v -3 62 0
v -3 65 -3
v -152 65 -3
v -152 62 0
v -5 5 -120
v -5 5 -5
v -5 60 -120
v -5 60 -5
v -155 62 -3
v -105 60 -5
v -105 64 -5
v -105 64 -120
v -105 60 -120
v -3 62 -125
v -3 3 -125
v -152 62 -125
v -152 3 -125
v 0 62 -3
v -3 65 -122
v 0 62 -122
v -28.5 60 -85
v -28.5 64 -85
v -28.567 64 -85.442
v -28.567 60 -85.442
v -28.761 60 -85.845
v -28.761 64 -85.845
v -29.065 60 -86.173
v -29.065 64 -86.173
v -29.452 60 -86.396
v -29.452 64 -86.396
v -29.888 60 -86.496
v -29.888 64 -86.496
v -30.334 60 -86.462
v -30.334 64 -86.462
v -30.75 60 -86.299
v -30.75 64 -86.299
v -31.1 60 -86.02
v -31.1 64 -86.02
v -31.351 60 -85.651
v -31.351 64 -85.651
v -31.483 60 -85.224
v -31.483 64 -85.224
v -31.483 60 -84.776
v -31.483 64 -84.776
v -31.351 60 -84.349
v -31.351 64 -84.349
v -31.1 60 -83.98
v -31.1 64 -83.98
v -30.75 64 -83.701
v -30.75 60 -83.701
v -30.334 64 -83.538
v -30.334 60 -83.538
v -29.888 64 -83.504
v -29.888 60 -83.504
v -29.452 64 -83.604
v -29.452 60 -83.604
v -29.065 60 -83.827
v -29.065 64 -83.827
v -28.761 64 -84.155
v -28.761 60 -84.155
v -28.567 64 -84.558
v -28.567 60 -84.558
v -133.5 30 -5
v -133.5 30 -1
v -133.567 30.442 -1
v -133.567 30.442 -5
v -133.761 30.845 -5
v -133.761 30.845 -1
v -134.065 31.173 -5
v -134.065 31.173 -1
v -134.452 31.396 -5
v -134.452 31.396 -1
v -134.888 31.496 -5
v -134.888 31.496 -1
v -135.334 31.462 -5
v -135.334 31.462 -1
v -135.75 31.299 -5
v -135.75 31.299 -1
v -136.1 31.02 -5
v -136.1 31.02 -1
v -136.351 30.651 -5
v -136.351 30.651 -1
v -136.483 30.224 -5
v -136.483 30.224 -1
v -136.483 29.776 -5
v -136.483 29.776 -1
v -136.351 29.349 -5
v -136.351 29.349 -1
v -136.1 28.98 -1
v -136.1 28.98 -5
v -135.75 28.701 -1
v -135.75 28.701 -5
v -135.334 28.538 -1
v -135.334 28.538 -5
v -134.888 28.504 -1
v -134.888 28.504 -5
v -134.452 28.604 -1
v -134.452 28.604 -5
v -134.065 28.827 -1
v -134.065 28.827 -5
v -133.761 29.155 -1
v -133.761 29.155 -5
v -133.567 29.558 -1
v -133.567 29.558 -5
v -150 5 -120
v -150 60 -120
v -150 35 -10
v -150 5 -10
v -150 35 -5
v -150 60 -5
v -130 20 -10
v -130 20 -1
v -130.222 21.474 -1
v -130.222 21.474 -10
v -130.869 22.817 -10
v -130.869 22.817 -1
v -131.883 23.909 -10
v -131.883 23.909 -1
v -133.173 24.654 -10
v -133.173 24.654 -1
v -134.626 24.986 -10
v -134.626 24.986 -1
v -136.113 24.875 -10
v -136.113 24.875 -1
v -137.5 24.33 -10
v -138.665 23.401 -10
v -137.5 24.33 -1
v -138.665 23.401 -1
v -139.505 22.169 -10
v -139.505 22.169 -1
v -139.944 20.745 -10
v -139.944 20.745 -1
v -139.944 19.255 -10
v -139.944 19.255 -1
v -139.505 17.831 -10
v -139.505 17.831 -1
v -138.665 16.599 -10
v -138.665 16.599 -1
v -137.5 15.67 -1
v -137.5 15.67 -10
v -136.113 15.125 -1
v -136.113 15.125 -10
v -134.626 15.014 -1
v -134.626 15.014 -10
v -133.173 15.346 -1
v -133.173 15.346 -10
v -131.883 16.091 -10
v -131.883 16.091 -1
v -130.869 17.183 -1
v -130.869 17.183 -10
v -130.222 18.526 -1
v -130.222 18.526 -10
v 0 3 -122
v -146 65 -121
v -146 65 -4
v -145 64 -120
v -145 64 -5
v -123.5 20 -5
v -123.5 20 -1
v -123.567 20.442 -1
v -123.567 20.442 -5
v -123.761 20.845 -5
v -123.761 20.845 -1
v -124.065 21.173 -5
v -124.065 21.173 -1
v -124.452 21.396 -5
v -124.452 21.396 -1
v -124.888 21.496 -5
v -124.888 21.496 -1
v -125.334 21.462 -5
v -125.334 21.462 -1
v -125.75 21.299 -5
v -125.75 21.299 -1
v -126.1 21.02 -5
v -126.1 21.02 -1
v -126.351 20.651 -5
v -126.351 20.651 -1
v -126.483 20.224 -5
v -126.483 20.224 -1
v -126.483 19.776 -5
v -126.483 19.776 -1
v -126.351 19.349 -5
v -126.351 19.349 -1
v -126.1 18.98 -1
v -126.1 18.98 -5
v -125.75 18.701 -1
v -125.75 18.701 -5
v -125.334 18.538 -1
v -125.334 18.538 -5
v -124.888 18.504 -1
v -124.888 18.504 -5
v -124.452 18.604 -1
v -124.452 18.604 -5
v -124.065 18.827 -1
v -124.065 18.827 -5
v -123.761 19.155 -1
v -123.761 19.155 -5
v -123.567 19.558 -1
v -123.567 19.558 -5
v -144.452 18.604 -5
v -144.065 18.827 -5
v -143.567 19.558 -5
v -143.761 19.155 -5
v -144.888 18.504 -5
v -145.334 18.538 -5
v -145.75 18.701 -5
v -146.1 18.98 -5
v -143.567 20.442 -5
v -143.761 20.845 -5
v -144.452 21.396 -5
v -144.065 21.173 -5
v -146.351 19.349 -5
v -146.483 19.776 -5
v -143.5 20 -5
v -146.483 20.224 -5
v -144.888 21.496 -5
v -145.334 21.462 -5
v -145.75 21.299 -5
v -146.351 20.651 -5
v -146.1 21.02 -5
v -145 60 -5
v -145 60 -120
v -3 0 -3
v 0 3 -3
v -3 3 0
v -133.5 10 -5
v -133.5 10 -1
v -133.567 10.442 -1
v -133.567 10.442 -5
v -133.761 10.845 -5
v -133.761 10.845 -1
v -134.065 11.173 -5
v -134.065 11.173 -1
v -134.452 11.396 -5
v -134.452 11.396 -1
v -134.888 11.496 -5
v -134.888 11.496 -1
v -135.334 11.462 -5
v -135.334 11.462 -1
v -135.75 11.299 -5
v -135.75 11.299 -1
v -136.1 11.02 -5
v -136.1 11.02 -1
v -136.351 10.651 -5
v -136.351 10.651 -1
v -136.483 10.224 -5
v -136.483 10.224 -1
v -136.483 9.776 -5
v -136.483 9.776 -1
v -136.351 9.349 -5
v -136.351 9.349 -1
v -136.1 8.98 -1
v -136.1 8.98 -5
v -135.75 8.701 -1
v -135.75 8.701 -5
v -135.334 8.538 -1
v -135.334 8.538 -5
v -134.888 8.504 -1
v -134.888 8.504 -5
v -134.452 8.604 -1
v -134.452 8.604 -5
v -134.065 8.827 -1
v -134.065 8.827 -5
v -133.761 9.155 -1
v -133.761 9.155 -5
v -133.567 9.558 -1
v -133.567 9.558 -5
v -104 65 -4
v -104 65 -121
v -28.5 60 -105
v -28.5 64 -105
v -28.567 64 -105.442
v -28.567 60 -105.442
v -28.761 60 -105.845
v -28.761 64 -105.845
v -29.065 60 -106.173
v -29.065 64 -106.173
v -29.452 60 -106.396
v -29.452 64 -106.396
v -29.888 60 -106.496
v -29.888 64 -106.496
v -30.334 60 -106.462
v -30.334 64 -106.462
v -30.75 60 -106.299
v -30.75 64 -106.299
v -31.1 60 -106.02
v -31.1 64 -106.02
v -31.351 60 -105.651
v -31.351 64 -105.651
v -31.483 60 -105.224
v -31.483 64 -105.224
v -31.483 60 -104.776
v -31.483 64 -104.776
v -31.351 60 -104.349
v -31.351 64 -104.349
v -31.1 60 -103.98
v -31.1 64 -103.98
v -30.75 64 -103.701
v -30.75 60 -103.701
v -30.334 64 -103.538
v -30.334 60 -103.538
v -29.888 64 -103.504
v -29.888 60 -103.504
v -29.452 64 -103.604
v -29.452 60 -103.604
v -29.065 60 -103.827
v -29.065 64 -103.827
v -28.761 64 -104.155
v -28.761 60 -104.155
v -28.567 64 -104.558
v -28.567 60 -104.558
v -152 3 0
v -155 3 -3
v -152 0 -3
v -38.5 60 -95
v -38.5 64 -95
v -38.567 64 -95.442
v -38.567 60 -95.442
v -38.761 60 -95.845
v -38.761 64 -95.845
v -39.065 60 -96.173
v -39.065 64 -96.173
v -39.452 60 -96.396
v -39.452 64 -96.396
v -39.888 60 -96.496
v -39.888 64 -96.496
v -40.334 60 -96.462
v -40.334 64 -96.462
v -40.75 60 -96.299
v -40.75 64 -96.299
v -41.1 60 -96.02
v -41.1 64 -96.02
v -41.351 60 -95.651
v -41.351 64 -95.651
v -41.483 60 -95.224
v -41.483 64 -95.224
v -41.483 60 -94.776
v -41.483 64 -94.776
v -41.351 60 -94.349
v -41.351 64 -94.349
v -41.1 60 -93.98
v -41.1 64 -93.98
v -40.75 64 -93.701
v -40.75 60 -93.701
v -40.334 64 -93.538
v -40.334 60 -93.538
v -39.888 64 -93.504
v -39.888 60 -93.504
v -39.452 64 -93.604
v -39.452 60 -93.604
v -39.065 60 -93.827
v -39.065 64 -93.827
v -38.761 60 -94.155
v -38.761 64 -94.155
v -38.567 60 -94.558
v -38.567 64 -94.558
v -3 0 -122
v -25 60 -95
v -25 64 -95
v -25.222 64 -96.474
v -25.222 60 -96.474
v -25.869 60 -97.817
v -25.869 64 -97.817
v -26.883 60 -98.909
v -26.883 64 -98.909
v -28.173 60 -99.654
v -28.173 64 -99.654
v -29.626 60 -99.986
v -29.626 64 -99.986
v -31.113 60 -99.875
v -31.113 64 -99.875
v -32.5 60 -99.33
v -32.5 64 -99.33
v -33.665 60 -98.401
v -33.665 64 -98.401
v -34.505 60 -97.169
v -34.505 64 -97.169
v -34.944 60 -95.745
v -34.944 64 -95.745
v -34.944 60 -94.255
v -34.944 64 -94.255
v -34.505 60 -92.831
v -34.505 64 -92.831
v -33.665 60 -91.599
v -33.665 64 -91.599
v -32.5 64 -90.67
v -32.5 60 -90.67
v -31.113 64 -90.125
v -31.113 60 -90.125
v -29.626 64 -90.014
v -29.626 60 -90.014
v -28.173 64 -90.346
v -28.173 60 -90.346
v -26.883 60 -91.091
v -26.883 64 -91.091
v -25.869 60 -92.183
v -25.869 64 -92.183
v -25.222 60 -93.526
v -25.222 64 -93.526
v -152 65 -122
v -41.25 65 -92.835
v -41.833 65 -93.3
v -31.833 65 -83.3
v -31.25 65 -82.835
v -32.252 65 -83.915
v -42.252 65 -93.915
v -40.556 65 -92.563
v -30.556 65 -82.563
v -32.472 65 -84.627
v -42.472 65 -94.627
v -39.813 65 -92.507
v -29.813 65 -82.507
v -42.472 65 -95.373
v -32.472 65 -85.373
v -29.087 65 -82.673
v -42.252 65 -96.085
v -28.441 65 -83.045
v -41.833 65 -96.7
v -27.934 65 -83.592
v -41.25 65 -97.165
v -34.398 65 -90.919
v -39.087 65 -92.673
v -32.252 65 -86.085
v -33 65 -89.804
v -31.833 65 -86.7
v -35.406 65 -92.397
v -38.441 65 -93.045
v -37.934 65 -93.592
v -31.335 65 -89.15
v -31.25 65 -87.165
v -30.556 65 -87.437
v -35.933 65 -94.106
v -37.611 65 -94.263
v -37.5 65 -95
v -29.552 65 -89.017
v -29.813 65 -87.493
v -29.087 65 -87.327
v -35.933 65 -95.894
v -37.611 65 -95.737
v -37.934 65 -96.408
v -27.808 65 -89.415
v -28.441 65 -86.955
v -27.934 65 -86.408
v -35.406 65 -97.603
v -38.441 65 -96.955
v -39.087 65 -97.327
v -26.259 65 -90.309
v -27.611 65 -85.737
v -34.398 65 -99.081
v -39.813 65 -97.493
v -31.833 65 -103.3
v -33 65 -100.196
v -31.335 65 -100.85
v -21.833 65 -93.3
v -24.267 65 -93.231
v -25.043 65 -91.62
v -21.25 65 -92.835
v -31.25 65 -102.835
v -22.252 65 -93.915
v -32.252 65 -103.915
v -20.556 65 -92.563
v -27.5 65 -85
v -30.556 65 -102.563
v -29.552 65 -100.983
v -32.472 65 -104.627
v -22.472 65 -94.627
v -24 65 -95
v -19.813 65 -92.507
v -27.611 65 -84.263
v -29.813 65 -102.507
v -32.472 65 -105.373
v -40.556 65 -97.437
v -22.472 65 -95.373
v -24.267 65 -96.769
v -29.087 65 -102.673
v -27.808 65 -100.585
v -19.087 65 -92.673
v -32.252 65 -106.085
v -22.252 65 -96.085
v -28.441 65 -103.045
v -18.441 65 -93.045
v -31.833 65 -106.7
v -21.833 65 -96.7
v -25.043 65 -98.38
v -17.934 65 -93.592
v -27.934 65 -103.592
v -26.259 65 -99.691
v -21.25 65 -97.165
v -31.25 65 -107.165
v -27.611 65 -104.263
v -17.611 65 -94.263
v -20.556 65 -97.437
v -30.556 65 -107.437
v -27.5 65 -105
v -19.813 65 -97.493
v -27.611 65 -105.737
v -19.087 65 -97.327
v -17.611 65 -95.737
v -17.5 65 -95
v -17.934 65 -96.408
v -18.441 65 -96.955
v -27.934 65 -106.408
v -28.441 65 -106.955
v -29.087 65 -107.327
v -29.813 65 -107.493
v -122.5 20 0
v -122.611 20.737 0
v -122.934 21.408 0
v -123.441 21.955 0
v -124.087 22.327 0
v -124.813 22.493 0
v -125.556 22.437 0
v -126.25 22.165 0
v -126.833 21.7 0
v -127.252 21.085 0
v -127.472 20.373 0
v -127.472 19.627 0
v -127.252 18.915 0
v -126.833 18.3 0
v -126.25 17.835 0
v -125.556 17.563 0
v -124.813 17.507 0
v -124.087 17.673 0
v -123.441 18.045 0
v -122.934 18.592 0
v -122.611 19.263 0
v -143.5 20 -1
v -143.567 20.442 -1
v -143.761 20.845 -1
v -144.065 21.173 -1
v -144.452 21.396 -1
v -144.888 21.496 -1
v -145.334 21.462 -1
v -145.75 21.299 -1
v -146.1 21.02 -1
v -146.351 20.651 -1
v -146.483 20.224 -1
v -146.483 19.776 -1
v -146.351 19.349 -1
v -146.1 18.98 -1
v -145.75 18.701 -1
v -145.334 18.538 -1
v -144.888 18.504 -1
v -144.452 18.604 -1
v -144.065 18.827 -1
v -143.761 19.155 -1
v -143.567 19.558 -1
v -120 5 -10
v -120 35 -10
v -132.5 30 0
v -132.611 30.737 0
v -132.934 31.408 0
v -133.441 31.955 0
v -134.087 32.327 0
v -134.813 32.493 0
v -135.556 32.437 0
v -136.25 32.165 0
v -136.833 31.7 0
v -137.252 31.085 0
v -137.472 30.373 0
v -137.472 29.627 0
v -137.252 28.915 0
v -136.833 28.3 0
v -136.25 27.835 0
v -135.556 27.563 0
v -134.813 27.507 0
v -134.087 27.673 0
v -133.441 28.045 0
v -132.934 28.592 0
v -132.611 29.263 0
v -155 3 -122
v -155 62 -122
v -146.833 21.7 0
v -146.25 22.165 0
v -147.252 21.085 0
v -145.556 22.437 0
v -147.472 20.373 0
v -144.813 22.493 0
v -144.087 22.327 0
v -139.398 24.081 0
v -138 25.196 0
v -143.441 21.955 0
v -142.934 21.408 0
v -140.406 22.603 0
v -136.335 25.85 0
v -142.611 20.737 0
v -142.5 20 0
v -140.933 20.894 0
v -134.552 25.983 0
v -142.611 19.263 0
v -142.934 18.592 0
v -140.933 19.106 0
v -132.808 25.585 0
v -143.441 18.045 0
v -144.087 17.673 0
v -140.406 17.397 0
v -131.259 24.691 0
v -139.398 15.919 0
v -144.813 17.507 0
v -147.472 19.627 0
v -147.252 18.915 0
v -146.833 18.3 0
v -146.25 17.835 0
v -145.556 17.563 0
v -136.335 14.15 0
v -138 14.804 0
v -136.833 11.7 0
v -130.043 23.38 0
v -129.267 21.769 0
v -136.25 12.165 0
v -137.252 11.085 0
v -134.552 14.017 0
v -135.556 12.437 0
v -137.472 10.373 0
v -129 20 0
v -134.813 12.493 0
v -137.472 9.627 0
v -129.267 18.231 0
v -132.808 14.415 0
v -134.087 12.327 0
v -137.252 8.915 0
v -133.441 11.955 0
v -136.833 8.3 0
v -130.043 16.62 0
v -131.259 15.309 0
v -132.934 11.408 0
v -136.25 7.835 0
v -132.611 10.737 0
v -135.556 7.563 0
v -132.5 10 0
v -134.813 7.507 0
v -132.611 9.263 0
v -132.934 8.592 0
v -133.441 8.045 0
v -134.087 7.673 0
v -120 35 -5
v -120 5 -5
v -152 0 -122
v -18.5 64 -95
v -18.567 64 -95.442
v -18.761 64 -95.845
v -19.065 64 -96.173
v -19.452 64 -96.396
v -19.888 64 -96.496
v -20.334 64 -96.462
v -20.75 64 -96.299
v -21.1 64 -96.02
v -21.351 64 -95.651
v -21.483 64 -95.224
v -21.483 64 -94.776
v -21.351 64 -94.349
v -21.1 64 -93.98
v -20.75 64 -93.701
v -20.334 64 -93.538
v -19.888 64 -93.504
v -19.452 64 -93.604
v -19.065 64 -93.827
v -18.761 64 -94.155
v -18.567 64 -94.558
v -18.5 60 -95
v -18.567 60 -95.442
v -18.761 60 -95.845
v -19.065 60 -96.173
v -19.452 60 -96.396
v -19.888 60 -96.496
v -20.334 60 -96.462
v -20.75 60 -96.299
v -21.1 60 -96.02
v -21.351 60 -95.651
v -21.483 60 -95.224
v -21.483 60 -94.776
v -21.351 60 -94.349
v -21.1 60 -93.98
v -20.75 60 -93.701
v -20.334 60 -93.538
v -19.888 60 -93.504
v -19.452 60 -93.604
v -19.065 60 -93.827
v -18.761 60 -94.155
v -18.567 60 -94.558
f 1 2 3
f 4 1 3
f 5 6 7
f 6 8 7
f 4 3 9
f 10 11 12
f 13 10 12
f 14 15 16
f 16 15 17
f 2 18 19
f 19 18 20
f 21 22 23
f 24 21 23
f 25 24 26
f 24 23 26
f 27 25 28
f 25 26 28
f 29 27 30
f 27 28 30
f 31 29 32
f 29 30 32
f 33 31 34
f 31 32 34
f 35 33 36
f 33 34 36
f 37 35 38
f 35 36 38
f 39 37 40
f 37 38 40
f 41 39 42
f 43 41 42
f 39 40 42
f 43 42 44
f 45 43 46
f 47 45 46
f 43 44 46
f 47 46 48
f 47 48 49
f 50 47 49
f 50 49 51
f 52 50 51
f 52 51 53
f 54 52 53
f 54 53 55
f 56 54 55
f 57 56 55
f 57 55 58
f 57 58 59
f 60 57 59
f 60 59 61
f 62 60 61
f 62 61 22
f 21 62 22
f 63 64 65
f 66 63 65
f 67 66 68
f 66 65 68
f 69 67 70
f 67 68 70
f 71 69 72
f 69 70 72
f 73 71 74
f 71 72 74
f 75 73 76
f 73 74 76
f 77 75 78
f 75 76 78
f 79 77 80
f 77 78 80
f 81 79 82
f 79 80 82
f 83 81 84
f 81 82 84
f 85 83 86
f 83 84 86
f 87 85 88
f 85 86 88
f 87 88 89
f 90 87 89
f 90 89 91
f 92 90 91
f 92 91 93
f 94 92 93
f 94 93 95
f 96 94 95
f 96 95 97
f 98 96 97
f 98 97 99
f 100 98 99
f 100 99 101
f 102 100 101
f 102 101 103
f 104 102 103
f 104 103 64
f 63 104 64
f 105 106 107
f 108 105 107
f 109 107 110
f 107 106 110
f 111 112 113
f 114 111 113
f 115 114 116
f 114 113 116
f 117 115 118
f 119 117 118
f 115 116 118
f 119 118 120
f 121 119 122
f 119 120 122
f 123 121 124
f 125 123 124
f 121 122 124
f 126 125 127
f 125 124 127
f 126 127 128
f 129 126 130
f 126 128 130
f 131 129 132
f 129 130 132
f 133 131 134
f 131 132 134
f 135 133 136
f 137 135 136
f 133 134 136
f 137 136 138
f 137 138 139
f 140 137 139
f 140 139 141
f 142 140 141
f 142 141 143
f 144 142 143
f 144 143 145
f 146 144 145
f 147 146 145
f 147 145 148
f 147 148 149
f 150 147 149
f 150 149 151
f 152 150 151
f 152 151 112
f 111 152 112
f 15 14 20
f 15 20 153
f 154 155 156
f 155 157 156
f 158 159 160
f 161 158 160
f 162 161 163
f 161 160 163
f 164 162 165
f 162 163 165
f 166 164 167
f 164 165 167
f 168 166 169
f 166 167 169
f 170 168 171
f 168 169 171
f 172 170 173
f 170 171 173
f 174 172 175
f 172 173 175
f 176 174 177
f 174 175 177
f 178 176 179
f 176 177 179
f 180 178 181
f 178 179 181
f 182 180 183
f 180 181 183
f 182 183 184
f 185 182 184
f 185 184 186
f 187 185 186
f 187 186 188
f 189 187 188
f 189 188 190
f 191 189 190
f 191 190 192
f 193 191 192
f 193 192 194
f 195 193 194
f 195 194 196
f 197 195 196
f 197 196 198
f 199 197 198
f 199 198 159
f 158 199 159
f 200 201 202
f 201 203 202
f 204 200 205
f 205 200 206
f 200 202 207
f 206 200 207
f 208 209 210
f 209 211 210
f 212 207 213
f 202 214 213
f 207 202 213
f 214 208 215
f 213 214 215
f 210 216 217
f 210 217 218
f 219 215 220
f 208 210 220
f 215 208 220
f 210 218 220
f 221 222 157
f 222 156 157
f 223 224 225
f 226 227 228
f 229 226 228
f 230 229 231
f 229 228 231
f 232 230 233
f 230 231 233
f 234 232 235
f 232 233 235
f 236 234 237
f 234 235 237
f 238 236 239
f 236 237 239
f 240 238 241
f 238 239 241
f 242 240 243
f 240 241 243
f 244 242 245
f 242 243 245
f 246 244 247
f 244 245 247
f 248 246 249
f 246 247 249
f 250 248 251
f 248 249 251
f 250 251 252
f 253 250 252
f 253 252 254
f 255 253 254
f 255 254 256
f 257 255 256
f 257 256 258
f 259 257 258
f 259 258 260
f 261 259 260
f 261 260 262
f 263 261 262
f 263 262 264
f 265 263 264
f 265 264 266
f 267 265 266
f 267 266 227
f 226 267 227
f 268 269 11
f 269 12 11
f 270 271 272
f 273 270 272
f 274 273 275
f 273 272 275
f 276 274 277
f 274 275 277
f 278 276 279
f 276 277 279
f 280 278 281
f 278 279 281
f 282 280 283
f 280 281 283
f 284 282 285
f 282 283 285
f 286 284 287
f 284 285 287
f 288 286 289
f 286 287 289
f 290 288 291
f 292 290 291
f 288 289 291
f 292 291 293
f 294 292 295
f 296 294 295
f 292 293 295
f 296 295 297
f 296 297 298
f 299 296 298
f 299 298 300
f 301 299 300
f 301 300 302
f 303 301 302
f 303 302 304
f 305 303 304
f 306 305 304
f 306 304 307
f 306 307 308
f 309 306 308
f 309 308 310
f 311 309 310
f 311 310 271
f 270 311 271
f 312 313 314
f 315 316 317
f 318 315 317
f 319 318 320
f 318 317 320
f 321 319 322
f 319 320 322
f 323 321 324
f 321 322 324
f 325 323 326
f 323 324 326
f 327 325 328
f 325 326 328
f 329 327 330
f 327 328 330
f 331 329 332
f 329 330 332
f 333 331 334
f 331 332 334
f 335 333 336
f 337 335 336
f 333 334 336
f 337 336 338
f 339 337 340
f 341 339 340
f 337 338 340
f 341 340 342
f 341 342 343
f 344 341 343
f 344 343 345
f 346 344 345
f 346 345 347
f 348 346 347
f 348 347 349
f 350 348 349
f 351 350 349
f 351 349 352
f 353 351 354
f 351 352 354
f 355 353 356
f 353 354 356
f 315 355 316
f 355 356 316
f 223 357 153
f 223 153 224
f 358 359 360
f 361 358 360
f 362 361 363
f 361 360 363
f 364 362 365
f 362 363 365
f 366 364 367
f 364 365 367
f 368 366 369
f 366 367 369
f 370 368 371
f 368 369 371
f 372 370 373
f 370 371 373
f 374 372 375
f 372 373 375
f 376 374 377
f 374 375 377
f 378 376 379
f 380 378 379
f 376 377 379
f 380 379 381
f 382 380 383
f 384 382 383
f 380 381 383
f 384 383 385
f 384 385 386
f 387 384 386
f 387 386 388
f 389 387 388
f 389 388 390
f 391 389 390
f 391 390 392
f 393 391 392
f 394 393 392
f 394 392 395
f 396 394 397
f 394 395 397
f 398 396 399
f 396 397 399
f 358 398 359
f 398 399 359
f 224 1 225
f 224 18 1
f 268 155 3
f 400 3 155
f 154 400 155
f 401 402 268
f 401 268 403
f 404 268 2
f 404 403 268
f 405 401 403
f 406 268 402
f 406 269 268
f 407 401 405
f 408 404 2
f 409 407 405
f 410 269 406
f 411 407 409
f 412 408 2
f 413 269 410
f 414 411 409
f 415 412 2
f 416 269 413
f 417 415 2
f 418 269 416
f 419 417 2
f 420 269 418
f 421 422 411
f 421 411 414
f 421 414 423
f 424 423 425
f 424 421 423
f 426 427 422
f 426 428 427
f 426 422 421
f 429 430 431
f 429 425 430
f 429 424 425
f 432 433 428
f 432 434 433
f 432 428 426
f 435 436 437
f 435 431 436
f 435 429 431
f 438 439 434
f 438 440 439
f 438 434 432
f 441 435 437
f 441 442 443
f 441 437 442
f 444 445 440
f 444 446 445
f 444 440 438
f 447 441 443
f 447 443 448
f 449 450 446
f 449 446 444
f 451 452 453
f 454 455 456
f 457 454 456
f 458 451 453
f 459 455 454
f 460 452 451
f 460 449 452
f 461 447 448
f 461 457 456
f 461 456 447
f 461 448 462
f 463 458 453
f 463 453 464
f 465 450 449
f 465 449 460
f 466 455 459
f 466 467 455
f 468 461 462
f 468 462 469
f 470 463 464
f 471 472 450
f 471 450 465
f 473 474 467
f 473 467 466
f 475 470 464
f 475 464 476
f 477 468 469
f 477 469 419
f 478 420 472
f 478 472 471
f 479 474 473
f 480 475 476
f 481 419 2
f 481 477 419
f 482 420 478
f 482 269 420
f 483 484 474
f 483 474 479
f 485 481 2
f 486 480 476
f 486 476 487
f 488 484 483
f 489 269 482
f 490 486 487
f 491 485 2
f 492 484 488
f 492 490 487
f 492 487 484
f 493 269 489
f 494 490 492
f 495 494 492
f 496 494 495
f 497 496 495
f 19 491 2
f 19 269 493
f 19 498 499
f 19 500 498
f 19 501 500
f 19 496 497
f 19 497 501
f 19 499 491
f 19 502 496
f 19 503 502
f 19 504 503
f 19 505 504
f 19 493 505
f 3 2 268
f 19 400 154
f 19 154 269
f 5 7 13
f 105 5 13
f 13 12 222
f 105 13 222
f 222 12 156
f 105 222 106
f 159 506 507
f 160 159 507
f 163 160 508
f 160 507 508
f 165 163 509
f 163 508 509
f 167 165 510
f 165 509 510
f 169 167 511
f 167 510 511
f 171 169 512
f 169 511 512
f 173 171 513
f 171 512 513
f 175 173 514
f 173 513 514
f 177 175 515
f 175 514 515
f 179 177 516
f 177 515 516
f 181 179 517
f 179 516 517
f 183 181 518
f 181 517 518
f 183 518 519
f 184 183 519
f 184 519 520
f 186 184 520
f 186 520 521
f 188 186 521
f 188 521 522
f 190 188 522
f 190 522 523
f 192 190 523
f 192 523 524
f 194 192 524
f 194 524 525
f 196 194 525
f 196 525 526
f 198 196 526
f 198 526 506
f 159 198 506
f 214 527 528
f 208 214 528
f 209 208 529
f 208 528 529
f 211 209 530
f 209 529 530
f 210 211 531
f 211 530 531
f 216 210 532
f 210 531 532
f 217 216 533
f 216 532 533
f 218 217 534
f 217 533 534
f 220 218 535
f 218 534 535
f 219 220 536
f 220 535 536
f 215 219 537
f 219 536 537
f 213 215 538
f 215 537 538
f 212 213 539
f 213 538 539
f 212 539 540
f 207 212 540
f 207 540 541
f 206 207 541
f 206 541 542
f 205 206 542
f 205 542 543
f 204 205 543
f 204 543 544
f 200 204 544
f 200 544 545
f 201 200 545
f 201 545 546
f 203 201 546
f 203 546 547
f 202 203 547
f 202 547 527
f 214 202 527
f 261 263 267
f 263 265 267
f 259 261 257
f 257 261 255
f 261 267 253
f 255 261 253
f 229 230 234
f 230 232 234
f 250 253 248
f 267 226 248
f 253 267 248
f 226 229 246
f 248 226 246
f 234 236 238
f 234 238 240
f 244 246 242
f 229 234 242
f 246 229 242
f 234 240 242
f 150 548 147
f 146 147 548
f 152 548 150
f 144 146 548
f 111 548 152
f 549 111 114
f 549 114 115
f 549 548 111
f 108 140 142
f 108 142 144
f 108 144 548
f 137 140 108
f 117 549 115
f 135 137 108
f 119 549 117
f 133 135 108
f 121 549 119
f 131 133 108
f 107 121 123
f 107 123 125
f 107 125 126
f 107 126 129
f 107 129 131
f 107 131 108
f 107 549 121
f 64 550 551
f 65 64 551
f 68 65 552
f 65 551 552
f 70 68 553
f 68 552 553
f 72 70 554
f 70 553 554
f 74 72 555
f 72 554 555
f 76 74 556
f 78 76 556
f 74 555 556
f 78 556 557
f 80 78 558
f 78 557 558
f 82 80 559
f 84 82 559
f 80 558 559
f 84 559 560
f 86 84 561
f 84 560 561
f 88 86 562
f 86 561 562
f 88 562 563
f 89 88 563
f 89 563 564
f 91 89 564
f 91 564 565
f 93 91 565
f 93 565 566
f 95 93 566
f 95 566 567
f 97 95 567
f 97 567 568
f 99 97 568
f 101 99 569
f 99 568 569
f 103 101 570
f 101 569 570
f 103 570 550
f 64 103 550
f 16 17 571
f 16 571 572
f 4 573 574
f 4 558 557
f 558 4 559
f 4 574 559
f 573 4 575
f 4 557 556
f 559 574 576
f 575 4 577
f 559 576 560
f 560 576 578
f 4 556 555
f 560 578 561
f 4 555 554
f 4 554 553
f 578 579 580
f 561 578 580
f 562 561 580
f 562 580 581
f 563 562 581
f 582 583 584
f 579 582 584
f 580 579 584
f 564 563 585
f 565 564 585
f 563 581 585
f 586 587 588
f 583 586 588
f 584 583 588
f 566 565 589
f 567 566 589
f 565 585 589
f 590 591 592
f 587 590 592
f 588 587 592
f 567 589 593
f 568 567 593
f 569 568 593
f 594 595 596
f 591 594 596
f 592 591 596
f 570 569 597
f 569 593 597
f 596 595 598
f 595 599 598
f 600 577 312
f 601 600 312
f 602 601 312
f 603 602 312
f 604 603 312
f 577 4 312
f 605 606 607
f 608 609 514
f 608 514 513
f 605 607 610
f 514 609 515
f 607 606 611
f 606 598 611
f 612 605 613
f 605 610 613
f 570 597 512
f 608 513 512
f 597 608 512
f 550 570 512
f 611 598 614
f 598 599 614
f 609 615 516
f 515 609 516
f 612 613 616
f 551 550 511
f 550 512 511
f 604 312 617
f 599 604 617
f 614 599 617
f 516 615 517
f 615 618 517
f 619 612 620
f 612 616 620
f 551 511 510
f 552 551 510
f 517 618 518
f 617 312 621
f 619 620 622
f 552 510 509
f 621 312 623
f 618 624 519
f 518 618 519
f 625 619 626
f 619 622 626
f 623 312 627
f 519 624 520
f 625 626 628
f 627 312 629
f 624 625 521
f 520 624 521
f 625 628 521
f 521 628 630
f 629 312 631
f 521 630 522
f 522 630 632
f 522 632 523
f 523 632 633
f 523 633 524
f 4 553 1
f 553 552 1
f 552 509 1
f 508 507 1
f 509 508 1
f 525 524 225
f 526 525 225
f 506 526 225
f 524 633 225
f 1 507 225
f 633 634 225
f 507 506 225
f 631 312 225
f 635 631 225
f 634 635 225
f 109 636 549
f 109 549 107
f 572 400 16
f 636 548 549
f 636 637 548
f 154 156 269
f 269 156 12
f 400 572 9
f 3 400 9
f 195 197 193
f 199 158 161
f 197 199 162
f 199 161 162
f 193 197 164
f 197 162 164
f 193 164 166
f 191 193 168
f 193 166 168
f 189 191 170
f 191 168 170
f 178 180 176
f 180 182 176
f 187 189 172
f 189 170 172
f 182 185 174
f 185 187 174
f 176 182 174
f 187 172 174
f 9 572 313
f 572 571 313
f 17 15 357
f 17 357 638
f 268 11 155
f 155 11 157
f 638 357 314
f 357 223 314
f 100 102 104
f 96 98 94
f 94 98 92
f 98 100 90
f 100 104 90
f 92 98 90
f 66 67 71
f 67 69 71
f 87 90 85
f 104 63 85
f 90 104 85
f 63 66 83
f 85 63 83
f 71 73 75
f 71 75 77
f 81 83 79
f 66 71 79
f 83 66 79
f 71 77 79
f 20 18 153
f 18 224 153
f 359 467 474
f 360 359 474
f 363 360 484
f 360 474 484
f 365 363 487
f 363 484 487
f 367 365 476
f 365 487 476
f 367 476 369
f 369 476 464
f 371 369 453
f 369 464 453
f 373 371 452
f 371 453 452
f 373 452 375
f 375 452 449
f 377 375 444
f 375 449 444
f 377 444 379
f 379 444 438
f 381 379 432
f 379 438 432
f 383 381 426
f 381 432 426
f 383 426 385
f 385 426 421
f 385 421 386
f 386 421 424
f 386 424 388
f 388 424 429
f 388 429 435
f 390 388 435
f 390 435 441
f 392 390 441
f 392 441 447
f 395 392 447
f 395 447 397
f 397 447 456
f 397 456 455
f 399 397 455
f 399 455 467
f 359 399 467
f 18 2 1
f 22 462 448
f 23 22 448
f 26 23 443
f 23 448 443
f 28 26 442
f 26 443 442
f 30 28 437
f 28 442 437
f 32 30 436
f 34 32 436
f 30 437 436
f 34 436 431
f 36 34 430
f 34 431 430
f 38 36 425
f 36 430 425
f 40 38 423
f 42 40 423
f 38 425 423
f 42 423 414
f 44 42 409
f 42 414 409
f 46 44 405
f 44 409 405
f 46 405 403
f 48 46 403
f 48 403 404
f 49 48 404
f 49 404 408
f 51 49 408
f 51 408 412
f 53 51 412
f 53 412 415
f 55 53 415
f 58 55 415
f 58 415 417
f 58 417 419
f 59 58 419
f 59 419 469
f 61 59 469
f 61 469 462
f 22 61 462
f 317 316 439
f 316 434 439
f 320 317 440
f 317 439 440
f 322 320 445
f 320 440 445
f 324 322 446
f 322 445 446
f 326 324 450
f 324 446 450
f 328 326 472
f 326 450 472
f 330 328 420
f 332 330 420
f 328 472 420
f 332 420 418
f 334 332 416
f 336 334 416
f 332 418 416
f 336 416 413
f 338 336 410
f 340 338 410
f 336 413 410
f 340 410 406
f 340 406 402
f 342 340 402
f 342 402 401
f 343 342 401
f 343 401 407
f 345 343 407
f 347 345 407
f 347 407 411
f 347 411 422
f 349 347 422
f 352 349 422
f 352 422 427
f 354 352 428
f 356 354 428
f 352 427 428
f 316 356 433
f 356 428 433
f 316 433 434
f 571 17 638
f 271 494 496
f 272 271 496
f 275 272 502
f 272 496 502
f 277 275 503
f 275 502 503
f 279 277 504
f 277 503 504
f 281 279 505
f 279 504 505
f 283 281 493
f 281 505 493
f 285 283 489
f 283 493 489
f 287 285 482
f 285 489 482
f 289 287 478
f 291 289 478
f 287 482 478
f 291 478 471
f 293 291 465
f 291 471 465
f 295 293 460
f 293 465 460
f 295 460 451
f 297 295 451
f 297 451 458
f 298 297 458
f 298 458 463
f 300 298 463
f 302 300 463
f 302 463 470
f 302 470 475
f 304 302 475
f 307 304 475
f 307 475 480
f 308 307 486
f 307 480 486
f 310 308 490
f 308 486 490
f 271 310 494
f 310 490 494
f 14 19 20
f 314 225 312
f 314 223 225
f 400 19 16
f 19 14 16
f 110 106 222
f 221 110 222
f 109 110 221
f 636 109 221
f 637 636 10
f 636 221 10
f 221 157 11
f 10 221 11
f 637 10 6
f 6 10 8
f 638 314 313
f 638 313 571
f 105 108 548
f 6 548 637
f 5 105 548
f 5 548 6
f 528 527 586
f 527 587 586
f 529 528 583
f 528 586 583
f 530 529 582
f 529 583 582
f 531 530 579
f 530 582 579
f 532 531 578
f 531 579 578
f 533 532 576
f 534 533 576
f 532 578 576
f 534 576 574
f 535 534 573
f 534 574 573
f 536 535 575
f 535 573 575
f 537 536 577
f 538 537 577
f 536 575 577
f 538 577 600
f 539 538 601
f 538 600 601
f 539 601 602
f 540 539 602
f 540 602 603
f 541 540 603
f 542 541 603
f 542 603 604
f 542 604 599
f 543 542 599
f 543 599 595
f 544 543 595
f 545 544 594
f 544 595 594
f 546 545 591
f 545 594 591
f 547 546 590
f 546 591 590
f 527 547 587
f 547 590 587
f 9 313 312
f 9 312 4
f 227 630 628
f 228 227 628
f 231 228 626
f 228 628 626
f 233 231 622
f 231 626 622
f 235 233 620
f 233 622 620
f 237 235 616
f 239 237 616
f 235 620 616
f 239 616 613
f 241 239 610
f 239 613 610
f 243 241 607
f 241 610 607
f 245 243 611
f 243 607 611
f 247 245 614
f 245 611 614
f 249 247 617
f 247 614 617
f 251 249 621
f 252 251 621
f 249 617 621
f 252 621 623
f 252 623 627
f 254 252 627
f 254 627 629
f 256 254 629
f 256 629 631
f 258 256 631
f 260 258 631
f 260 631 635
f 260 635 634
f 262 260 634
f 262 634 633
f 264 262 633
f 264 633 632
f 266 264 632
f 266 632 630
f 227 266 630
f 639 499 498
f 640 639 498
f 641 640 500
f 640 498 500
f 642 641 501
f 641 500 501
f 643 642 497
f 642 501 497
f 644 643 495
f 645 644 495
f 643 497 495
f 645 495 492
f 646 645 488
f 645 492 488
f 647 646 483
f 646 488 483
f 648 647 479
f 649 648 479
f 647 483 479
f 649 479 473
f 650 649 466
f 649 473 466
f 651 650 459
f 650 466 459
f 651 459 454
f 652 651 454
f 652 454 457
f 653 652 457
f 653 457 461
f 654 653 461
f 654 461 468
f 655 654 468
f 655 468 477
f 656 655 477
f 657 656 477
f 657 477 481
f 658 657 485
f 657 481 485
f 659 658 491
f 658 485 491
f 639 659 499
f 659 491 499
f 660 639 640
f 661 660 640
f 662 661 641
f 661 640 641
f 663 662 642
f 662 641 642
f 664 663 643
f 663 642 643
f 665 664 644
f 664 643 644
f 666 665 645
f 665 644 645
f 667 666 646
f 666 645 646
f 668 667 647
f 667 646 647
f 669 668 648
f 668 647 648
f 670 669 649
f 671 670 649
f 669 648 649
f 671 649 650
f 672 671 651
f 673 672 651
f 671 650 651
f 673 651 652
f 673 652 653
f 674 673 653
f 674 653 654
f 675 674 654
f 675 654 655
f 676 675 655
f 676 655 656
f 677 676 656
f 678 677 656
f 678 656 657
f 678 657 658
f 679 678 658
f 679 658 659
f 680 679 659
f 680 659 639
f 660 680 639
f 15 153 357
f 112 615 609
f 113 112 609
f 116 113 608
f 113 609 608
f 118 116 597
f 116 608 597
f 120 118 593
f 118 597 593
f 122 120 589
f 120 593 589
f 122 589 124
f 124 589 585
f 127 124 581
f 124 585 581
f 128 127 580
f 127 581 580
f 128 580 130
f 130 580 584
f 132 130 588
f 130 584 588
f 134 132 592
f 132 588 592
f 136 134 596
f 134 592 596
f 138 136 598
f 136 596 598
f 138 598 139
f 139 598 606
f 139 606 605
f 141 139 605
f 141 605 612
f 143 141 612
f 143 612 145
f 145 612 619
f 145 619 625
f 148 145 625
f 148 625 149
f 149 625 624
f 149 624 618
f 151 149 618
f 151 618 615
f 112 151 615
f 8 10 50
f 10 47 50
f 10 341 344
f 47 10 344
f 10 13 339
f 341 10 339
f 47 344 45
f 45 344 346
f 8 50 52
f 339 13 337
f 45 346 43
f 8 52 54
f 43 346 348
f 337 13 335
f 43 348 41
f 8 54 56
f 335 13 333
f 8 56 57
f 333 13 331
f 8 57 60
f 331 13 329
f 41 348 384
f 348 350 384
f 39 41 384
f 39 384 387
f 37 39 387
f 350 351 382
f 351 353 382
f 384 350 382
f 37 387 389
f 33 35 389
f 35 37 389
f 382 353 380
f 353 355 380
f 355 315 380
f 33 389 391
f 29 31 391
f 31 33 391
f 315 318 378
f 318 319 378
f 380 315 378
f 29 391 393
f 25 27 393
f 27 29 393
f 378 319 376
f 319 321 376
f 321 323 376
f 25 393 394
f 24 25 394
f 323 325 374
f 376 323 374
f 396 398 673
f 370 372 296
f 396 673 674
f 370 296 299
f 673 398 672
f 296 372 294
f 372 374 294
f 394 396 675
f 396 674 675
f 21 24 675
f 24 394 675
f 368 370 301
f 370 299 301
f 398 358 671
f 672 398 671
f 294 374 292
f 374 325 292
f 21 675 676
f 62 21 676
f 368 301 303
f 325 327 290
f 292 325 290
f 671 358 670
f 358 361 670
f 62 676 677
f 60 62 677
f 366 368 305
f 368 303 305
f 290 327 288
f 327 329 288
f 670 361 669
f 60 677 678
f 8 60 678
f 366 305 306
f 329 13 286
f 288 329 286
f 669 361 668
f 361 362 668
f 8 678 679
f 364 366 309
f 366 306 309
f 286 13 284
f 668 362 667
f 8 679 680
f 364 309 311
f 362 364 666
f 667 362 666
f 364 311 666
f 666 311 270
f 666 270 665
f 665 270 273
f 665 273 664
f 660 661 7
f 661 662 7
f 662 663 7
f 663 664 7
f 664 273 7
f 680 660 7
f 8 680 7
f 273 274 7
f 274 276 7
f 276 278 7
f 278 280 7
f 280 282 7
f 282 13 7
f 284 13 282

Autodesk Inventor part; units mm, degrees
ref_plane "YZ Plane" through (0, 0, 0) normal (1, 0, 0) x (0, 1, 0)
ref_plane "XZ Plane" through (0, 0, 0) normal (0, 1, 0) x (-1, 0, 0)
ref_plane "XY Plane" through (0, 0, 0) normal (0, 0, 1) x (1, 0, 0)
sketch "Sketch1" plane through (0, 0, 0) normal (0, 1, 0) x (-1, 0, 0)
  line L0 (0, 0) -> (155, 0)
  line L1 (155, 0) -> (155, -125)
  line L2 (155, -125) -> (0, -125)
  line L3 (0, -125) -> (0, 0)
  dimension "d0" = 125
  dimension "d1" = 155
extrude "Extrusion1" add sketch "Sketch1" along normal blind 60
sketch "Sketch2" plane through (0, 60, 0) normal (0, 1, 0) x (1, 0, 0)
  line L0 (-150, 5) -> (-5, 5)
  line L1 (-5, 5) -> (-5, 120)
  line L2 (-5, 120) -> (-150, 120)
  line L3 (-150, 120) -> (-150, 5)
  line L4 (-155, 0) -> (0, 0) projected
  line L5 (0, 125) -> (-155, 125) projected
  line L6 (-155, 125) -> (-155, 0) projected
  line L7 (0, 0) -> (0, 125) projected
  point P0 (-77.5, 125)
  dimension "d4" = 5
  dimension "d5" = 5
  dimension "d6" = 5
  dimension "d7" = 5
extrude "Extrusion2" cut sketch "Sketch2" against normal blind 55 contours L3 L2 L1 L0
sketch "Sketch3" plane through (0, 60, 0) normal (0, 1, 0) x (1, 0, 0)
  line L0 (-155, 0) -> (0, 0) projected
  line L1 (-155, 0) -> (0, 0)
  line L2 (0, 0) -> (0, 125)
  line L3 (0, 125) -> (-155, 125)
  line L4 (-155, 125) -> (-155, 0)
extrude "Extrusion3" add sketch "Sketch3" along normal blind 5
sketch "Sketch4" plane through (0, 65, 0) normal (0, 1, 0) x (1, 0, 0)
  circle A0 centre (-30, 95) radius 5
  line L0 (0, 125) -> (-155, 125) projected
  line L1 (0, 0) -> (0, 125) projected
  dimension "d12" = 10
  dimension "d13" = 30
  dimension "d14" = 30
extrude "Extrusion4" cut sketch "Sketch4" against normal blind 5
sketch "Sketch5" plane through (-155, 0, 0) normal (0, 0, 1) x (1, 0, 0)
  circle A0 centre (20, 20) radius 5
  line L0 (0, 0) -> (155, 0) projected
  line L1 (0, 0) -> (0, 65) projected
  dimension "d17" = 20
  dimension "d18" = 20
  dimension "d19" = 10
extrude "Extrusion5" cut sketch "Sketch5" against normal blind 20
sketch "Sketch6" plane through (0, 65, 0) normal (0, 1, 0) x (1, 0, 0)
  line L0 (-145, 5) -> (-105, 5)
  line L1 (-105, 5) -> (-105, 120)
  line L2 (-105, 120) -> (-145, 120)
  line L3 (-145, 120) -> (-145, 5)
  line L4 (-155, 125) -> (-155, 0) projected
  line L5 (0, 125) -> (-155, 125) projected
  line L6 (-155, 0) -> (0, 0) projected
  point P0 (-125, 5)
  dimension "d22" = 10
  dimension "d23" = 5
  dimension "d24" = 5
  dimension "d25" = 40
extrude "Extrusion6" cut sketch "Sketch6" against normal blind 5
sketch "Sketch7" plane through (-155, 0, 0) normal (0, 0, 1) x (1, 0, 0)
  circle A0 centre (20, 30) radius 1.5
  circle A1 centre (20, 20) radius 5 projected
  circle A2 centre (20, 20) radius 5
  circle A3 centre (10, 20) radius 1.5
  circle A4 centre (20, 10) radius 1.5
  circle A5 centre (30, 20) radius 1.5
  point P0 (155, 0)
  dimension "d28" = 3
  dimension "d31" = 360
  dimension "d35" = 10
extrude "Extrusion7" cut sketch "Sketch7" against normal blind 5 contours A0 | A3 | A4 | A5
sketch "Sketch8" plane through (0, 65, 0) normal (0, 1, 0) x (1, 0, 0)
  point P0 (0, 0)
sketch "Sketch9" plane through (0, 65, 0) normal (0, 1, 0) x (1, 0, 0)
  point P0 (0, 0)
sketch "Sketch10" plane through (0, 65, 0) normal (0, 1, 0) x (1, 0, 0)
  point P0 (0, 0)
sketch "Sketch11" plane through (0, 65, 0) normal (0, 1, 0) x (1, 0, 0)
  circle A0 centre (-40, 95) radius 1.5
  circle A1 centre (-30, 95) radius 5 projected
  circle A2 centre (-30, 95) radius 5
  circle A3 centre (-30, 85) radius 1.5
  circle A4 centre (-20, 95) radius 1.5
  circle A5 centre (-30, 105) radius 1.5
  point P0 (0, 0)
  dimension "d36" = 10
  dimension "d37" = 3
  dimension "d40" = 360
extrude "Extrusion8" cut sketch "Sketch11" against normal blind 5 contours A0 | A3 | A4 | A5
chamfer "Chamfer1" distance 1 angle 45 8 edges at (-31.5, 65, -105) (-21.5, 65, -95) (-31.5, 65, -85) (-41.5, 65, -95) (-126.5, 20, 0) (-136.5, 30, 0) (-136.5, 10, 0) (-146.5, 20, 0)
chamfer "Chamfer3" distance 1 angle 45 4 edges at (-105, 65, -62.5) (-125, 65, -120) (-145, 65, -62.5) (-125, 65, -5)
sketch "Sketch12" plane through (-5, 5, -5) normal (0, 0, -1) x (-1, 0, 0)
  line L0 (0, 0) -> (145, 0) projected
  line L1 (145, 0) -> (115, 0)
  line L2 (115, 0) -> (115, 30)
  line L3 (115, 30) -> (145, 30)
  line L4 (145, 30) -> (145, 0)
  point P0 (-5, -5)
  point P1 (115, 0)
  dimension "d53" = 30
  dimension "d54" = 30
extrude "Extrusion9" add sketch "Sketch12" along normal blind 5
sketch "Sketch13" plane through (-155, 0, 0) normal (0, 0, 1) x (1, 0, 0)
  point P0 (155, 0)
sketch "Sketch14" plane through (-135, 20, -5) normal (0, 0, 1) x (1, 0, 0)
  circle A0 centre (0, 0) radius 5
  point P0 (135, -20)
extrude "Extrusion10" cut sketch "Sketch14" against normal blind 20
chamfer "Chamfer4" distance 1 angle 45 2 edges at (-35, 65, -95) (-140, 20, 0)
chamfer "Chamfer5" distance 3 angle 45 12 edges at (0, 65, -62.5) (-77.5, 65, 0) (-155, 65, -62.5) (-77.5, 65, -125) (0, 32.5, 0) (0, 32.5, -125) (-155, 32.5, -125) (-155, 32.5, 0) (0, 0, -62.5) (-77.5, 0, -125) (-155, 0, -62.5) (-77.5, 0, 0)
sketch "Sketch15" plane through (0, 65, 0) normal (0, 1, 0) x (1, 0, 0)
  point P0 (0, 0)
sketch "Sketch16" plane through (0, 65, 0) normal (0, 1, 0) x (1, 0, 0)
  point P0 (0, 0)
properties part number "Water container"
